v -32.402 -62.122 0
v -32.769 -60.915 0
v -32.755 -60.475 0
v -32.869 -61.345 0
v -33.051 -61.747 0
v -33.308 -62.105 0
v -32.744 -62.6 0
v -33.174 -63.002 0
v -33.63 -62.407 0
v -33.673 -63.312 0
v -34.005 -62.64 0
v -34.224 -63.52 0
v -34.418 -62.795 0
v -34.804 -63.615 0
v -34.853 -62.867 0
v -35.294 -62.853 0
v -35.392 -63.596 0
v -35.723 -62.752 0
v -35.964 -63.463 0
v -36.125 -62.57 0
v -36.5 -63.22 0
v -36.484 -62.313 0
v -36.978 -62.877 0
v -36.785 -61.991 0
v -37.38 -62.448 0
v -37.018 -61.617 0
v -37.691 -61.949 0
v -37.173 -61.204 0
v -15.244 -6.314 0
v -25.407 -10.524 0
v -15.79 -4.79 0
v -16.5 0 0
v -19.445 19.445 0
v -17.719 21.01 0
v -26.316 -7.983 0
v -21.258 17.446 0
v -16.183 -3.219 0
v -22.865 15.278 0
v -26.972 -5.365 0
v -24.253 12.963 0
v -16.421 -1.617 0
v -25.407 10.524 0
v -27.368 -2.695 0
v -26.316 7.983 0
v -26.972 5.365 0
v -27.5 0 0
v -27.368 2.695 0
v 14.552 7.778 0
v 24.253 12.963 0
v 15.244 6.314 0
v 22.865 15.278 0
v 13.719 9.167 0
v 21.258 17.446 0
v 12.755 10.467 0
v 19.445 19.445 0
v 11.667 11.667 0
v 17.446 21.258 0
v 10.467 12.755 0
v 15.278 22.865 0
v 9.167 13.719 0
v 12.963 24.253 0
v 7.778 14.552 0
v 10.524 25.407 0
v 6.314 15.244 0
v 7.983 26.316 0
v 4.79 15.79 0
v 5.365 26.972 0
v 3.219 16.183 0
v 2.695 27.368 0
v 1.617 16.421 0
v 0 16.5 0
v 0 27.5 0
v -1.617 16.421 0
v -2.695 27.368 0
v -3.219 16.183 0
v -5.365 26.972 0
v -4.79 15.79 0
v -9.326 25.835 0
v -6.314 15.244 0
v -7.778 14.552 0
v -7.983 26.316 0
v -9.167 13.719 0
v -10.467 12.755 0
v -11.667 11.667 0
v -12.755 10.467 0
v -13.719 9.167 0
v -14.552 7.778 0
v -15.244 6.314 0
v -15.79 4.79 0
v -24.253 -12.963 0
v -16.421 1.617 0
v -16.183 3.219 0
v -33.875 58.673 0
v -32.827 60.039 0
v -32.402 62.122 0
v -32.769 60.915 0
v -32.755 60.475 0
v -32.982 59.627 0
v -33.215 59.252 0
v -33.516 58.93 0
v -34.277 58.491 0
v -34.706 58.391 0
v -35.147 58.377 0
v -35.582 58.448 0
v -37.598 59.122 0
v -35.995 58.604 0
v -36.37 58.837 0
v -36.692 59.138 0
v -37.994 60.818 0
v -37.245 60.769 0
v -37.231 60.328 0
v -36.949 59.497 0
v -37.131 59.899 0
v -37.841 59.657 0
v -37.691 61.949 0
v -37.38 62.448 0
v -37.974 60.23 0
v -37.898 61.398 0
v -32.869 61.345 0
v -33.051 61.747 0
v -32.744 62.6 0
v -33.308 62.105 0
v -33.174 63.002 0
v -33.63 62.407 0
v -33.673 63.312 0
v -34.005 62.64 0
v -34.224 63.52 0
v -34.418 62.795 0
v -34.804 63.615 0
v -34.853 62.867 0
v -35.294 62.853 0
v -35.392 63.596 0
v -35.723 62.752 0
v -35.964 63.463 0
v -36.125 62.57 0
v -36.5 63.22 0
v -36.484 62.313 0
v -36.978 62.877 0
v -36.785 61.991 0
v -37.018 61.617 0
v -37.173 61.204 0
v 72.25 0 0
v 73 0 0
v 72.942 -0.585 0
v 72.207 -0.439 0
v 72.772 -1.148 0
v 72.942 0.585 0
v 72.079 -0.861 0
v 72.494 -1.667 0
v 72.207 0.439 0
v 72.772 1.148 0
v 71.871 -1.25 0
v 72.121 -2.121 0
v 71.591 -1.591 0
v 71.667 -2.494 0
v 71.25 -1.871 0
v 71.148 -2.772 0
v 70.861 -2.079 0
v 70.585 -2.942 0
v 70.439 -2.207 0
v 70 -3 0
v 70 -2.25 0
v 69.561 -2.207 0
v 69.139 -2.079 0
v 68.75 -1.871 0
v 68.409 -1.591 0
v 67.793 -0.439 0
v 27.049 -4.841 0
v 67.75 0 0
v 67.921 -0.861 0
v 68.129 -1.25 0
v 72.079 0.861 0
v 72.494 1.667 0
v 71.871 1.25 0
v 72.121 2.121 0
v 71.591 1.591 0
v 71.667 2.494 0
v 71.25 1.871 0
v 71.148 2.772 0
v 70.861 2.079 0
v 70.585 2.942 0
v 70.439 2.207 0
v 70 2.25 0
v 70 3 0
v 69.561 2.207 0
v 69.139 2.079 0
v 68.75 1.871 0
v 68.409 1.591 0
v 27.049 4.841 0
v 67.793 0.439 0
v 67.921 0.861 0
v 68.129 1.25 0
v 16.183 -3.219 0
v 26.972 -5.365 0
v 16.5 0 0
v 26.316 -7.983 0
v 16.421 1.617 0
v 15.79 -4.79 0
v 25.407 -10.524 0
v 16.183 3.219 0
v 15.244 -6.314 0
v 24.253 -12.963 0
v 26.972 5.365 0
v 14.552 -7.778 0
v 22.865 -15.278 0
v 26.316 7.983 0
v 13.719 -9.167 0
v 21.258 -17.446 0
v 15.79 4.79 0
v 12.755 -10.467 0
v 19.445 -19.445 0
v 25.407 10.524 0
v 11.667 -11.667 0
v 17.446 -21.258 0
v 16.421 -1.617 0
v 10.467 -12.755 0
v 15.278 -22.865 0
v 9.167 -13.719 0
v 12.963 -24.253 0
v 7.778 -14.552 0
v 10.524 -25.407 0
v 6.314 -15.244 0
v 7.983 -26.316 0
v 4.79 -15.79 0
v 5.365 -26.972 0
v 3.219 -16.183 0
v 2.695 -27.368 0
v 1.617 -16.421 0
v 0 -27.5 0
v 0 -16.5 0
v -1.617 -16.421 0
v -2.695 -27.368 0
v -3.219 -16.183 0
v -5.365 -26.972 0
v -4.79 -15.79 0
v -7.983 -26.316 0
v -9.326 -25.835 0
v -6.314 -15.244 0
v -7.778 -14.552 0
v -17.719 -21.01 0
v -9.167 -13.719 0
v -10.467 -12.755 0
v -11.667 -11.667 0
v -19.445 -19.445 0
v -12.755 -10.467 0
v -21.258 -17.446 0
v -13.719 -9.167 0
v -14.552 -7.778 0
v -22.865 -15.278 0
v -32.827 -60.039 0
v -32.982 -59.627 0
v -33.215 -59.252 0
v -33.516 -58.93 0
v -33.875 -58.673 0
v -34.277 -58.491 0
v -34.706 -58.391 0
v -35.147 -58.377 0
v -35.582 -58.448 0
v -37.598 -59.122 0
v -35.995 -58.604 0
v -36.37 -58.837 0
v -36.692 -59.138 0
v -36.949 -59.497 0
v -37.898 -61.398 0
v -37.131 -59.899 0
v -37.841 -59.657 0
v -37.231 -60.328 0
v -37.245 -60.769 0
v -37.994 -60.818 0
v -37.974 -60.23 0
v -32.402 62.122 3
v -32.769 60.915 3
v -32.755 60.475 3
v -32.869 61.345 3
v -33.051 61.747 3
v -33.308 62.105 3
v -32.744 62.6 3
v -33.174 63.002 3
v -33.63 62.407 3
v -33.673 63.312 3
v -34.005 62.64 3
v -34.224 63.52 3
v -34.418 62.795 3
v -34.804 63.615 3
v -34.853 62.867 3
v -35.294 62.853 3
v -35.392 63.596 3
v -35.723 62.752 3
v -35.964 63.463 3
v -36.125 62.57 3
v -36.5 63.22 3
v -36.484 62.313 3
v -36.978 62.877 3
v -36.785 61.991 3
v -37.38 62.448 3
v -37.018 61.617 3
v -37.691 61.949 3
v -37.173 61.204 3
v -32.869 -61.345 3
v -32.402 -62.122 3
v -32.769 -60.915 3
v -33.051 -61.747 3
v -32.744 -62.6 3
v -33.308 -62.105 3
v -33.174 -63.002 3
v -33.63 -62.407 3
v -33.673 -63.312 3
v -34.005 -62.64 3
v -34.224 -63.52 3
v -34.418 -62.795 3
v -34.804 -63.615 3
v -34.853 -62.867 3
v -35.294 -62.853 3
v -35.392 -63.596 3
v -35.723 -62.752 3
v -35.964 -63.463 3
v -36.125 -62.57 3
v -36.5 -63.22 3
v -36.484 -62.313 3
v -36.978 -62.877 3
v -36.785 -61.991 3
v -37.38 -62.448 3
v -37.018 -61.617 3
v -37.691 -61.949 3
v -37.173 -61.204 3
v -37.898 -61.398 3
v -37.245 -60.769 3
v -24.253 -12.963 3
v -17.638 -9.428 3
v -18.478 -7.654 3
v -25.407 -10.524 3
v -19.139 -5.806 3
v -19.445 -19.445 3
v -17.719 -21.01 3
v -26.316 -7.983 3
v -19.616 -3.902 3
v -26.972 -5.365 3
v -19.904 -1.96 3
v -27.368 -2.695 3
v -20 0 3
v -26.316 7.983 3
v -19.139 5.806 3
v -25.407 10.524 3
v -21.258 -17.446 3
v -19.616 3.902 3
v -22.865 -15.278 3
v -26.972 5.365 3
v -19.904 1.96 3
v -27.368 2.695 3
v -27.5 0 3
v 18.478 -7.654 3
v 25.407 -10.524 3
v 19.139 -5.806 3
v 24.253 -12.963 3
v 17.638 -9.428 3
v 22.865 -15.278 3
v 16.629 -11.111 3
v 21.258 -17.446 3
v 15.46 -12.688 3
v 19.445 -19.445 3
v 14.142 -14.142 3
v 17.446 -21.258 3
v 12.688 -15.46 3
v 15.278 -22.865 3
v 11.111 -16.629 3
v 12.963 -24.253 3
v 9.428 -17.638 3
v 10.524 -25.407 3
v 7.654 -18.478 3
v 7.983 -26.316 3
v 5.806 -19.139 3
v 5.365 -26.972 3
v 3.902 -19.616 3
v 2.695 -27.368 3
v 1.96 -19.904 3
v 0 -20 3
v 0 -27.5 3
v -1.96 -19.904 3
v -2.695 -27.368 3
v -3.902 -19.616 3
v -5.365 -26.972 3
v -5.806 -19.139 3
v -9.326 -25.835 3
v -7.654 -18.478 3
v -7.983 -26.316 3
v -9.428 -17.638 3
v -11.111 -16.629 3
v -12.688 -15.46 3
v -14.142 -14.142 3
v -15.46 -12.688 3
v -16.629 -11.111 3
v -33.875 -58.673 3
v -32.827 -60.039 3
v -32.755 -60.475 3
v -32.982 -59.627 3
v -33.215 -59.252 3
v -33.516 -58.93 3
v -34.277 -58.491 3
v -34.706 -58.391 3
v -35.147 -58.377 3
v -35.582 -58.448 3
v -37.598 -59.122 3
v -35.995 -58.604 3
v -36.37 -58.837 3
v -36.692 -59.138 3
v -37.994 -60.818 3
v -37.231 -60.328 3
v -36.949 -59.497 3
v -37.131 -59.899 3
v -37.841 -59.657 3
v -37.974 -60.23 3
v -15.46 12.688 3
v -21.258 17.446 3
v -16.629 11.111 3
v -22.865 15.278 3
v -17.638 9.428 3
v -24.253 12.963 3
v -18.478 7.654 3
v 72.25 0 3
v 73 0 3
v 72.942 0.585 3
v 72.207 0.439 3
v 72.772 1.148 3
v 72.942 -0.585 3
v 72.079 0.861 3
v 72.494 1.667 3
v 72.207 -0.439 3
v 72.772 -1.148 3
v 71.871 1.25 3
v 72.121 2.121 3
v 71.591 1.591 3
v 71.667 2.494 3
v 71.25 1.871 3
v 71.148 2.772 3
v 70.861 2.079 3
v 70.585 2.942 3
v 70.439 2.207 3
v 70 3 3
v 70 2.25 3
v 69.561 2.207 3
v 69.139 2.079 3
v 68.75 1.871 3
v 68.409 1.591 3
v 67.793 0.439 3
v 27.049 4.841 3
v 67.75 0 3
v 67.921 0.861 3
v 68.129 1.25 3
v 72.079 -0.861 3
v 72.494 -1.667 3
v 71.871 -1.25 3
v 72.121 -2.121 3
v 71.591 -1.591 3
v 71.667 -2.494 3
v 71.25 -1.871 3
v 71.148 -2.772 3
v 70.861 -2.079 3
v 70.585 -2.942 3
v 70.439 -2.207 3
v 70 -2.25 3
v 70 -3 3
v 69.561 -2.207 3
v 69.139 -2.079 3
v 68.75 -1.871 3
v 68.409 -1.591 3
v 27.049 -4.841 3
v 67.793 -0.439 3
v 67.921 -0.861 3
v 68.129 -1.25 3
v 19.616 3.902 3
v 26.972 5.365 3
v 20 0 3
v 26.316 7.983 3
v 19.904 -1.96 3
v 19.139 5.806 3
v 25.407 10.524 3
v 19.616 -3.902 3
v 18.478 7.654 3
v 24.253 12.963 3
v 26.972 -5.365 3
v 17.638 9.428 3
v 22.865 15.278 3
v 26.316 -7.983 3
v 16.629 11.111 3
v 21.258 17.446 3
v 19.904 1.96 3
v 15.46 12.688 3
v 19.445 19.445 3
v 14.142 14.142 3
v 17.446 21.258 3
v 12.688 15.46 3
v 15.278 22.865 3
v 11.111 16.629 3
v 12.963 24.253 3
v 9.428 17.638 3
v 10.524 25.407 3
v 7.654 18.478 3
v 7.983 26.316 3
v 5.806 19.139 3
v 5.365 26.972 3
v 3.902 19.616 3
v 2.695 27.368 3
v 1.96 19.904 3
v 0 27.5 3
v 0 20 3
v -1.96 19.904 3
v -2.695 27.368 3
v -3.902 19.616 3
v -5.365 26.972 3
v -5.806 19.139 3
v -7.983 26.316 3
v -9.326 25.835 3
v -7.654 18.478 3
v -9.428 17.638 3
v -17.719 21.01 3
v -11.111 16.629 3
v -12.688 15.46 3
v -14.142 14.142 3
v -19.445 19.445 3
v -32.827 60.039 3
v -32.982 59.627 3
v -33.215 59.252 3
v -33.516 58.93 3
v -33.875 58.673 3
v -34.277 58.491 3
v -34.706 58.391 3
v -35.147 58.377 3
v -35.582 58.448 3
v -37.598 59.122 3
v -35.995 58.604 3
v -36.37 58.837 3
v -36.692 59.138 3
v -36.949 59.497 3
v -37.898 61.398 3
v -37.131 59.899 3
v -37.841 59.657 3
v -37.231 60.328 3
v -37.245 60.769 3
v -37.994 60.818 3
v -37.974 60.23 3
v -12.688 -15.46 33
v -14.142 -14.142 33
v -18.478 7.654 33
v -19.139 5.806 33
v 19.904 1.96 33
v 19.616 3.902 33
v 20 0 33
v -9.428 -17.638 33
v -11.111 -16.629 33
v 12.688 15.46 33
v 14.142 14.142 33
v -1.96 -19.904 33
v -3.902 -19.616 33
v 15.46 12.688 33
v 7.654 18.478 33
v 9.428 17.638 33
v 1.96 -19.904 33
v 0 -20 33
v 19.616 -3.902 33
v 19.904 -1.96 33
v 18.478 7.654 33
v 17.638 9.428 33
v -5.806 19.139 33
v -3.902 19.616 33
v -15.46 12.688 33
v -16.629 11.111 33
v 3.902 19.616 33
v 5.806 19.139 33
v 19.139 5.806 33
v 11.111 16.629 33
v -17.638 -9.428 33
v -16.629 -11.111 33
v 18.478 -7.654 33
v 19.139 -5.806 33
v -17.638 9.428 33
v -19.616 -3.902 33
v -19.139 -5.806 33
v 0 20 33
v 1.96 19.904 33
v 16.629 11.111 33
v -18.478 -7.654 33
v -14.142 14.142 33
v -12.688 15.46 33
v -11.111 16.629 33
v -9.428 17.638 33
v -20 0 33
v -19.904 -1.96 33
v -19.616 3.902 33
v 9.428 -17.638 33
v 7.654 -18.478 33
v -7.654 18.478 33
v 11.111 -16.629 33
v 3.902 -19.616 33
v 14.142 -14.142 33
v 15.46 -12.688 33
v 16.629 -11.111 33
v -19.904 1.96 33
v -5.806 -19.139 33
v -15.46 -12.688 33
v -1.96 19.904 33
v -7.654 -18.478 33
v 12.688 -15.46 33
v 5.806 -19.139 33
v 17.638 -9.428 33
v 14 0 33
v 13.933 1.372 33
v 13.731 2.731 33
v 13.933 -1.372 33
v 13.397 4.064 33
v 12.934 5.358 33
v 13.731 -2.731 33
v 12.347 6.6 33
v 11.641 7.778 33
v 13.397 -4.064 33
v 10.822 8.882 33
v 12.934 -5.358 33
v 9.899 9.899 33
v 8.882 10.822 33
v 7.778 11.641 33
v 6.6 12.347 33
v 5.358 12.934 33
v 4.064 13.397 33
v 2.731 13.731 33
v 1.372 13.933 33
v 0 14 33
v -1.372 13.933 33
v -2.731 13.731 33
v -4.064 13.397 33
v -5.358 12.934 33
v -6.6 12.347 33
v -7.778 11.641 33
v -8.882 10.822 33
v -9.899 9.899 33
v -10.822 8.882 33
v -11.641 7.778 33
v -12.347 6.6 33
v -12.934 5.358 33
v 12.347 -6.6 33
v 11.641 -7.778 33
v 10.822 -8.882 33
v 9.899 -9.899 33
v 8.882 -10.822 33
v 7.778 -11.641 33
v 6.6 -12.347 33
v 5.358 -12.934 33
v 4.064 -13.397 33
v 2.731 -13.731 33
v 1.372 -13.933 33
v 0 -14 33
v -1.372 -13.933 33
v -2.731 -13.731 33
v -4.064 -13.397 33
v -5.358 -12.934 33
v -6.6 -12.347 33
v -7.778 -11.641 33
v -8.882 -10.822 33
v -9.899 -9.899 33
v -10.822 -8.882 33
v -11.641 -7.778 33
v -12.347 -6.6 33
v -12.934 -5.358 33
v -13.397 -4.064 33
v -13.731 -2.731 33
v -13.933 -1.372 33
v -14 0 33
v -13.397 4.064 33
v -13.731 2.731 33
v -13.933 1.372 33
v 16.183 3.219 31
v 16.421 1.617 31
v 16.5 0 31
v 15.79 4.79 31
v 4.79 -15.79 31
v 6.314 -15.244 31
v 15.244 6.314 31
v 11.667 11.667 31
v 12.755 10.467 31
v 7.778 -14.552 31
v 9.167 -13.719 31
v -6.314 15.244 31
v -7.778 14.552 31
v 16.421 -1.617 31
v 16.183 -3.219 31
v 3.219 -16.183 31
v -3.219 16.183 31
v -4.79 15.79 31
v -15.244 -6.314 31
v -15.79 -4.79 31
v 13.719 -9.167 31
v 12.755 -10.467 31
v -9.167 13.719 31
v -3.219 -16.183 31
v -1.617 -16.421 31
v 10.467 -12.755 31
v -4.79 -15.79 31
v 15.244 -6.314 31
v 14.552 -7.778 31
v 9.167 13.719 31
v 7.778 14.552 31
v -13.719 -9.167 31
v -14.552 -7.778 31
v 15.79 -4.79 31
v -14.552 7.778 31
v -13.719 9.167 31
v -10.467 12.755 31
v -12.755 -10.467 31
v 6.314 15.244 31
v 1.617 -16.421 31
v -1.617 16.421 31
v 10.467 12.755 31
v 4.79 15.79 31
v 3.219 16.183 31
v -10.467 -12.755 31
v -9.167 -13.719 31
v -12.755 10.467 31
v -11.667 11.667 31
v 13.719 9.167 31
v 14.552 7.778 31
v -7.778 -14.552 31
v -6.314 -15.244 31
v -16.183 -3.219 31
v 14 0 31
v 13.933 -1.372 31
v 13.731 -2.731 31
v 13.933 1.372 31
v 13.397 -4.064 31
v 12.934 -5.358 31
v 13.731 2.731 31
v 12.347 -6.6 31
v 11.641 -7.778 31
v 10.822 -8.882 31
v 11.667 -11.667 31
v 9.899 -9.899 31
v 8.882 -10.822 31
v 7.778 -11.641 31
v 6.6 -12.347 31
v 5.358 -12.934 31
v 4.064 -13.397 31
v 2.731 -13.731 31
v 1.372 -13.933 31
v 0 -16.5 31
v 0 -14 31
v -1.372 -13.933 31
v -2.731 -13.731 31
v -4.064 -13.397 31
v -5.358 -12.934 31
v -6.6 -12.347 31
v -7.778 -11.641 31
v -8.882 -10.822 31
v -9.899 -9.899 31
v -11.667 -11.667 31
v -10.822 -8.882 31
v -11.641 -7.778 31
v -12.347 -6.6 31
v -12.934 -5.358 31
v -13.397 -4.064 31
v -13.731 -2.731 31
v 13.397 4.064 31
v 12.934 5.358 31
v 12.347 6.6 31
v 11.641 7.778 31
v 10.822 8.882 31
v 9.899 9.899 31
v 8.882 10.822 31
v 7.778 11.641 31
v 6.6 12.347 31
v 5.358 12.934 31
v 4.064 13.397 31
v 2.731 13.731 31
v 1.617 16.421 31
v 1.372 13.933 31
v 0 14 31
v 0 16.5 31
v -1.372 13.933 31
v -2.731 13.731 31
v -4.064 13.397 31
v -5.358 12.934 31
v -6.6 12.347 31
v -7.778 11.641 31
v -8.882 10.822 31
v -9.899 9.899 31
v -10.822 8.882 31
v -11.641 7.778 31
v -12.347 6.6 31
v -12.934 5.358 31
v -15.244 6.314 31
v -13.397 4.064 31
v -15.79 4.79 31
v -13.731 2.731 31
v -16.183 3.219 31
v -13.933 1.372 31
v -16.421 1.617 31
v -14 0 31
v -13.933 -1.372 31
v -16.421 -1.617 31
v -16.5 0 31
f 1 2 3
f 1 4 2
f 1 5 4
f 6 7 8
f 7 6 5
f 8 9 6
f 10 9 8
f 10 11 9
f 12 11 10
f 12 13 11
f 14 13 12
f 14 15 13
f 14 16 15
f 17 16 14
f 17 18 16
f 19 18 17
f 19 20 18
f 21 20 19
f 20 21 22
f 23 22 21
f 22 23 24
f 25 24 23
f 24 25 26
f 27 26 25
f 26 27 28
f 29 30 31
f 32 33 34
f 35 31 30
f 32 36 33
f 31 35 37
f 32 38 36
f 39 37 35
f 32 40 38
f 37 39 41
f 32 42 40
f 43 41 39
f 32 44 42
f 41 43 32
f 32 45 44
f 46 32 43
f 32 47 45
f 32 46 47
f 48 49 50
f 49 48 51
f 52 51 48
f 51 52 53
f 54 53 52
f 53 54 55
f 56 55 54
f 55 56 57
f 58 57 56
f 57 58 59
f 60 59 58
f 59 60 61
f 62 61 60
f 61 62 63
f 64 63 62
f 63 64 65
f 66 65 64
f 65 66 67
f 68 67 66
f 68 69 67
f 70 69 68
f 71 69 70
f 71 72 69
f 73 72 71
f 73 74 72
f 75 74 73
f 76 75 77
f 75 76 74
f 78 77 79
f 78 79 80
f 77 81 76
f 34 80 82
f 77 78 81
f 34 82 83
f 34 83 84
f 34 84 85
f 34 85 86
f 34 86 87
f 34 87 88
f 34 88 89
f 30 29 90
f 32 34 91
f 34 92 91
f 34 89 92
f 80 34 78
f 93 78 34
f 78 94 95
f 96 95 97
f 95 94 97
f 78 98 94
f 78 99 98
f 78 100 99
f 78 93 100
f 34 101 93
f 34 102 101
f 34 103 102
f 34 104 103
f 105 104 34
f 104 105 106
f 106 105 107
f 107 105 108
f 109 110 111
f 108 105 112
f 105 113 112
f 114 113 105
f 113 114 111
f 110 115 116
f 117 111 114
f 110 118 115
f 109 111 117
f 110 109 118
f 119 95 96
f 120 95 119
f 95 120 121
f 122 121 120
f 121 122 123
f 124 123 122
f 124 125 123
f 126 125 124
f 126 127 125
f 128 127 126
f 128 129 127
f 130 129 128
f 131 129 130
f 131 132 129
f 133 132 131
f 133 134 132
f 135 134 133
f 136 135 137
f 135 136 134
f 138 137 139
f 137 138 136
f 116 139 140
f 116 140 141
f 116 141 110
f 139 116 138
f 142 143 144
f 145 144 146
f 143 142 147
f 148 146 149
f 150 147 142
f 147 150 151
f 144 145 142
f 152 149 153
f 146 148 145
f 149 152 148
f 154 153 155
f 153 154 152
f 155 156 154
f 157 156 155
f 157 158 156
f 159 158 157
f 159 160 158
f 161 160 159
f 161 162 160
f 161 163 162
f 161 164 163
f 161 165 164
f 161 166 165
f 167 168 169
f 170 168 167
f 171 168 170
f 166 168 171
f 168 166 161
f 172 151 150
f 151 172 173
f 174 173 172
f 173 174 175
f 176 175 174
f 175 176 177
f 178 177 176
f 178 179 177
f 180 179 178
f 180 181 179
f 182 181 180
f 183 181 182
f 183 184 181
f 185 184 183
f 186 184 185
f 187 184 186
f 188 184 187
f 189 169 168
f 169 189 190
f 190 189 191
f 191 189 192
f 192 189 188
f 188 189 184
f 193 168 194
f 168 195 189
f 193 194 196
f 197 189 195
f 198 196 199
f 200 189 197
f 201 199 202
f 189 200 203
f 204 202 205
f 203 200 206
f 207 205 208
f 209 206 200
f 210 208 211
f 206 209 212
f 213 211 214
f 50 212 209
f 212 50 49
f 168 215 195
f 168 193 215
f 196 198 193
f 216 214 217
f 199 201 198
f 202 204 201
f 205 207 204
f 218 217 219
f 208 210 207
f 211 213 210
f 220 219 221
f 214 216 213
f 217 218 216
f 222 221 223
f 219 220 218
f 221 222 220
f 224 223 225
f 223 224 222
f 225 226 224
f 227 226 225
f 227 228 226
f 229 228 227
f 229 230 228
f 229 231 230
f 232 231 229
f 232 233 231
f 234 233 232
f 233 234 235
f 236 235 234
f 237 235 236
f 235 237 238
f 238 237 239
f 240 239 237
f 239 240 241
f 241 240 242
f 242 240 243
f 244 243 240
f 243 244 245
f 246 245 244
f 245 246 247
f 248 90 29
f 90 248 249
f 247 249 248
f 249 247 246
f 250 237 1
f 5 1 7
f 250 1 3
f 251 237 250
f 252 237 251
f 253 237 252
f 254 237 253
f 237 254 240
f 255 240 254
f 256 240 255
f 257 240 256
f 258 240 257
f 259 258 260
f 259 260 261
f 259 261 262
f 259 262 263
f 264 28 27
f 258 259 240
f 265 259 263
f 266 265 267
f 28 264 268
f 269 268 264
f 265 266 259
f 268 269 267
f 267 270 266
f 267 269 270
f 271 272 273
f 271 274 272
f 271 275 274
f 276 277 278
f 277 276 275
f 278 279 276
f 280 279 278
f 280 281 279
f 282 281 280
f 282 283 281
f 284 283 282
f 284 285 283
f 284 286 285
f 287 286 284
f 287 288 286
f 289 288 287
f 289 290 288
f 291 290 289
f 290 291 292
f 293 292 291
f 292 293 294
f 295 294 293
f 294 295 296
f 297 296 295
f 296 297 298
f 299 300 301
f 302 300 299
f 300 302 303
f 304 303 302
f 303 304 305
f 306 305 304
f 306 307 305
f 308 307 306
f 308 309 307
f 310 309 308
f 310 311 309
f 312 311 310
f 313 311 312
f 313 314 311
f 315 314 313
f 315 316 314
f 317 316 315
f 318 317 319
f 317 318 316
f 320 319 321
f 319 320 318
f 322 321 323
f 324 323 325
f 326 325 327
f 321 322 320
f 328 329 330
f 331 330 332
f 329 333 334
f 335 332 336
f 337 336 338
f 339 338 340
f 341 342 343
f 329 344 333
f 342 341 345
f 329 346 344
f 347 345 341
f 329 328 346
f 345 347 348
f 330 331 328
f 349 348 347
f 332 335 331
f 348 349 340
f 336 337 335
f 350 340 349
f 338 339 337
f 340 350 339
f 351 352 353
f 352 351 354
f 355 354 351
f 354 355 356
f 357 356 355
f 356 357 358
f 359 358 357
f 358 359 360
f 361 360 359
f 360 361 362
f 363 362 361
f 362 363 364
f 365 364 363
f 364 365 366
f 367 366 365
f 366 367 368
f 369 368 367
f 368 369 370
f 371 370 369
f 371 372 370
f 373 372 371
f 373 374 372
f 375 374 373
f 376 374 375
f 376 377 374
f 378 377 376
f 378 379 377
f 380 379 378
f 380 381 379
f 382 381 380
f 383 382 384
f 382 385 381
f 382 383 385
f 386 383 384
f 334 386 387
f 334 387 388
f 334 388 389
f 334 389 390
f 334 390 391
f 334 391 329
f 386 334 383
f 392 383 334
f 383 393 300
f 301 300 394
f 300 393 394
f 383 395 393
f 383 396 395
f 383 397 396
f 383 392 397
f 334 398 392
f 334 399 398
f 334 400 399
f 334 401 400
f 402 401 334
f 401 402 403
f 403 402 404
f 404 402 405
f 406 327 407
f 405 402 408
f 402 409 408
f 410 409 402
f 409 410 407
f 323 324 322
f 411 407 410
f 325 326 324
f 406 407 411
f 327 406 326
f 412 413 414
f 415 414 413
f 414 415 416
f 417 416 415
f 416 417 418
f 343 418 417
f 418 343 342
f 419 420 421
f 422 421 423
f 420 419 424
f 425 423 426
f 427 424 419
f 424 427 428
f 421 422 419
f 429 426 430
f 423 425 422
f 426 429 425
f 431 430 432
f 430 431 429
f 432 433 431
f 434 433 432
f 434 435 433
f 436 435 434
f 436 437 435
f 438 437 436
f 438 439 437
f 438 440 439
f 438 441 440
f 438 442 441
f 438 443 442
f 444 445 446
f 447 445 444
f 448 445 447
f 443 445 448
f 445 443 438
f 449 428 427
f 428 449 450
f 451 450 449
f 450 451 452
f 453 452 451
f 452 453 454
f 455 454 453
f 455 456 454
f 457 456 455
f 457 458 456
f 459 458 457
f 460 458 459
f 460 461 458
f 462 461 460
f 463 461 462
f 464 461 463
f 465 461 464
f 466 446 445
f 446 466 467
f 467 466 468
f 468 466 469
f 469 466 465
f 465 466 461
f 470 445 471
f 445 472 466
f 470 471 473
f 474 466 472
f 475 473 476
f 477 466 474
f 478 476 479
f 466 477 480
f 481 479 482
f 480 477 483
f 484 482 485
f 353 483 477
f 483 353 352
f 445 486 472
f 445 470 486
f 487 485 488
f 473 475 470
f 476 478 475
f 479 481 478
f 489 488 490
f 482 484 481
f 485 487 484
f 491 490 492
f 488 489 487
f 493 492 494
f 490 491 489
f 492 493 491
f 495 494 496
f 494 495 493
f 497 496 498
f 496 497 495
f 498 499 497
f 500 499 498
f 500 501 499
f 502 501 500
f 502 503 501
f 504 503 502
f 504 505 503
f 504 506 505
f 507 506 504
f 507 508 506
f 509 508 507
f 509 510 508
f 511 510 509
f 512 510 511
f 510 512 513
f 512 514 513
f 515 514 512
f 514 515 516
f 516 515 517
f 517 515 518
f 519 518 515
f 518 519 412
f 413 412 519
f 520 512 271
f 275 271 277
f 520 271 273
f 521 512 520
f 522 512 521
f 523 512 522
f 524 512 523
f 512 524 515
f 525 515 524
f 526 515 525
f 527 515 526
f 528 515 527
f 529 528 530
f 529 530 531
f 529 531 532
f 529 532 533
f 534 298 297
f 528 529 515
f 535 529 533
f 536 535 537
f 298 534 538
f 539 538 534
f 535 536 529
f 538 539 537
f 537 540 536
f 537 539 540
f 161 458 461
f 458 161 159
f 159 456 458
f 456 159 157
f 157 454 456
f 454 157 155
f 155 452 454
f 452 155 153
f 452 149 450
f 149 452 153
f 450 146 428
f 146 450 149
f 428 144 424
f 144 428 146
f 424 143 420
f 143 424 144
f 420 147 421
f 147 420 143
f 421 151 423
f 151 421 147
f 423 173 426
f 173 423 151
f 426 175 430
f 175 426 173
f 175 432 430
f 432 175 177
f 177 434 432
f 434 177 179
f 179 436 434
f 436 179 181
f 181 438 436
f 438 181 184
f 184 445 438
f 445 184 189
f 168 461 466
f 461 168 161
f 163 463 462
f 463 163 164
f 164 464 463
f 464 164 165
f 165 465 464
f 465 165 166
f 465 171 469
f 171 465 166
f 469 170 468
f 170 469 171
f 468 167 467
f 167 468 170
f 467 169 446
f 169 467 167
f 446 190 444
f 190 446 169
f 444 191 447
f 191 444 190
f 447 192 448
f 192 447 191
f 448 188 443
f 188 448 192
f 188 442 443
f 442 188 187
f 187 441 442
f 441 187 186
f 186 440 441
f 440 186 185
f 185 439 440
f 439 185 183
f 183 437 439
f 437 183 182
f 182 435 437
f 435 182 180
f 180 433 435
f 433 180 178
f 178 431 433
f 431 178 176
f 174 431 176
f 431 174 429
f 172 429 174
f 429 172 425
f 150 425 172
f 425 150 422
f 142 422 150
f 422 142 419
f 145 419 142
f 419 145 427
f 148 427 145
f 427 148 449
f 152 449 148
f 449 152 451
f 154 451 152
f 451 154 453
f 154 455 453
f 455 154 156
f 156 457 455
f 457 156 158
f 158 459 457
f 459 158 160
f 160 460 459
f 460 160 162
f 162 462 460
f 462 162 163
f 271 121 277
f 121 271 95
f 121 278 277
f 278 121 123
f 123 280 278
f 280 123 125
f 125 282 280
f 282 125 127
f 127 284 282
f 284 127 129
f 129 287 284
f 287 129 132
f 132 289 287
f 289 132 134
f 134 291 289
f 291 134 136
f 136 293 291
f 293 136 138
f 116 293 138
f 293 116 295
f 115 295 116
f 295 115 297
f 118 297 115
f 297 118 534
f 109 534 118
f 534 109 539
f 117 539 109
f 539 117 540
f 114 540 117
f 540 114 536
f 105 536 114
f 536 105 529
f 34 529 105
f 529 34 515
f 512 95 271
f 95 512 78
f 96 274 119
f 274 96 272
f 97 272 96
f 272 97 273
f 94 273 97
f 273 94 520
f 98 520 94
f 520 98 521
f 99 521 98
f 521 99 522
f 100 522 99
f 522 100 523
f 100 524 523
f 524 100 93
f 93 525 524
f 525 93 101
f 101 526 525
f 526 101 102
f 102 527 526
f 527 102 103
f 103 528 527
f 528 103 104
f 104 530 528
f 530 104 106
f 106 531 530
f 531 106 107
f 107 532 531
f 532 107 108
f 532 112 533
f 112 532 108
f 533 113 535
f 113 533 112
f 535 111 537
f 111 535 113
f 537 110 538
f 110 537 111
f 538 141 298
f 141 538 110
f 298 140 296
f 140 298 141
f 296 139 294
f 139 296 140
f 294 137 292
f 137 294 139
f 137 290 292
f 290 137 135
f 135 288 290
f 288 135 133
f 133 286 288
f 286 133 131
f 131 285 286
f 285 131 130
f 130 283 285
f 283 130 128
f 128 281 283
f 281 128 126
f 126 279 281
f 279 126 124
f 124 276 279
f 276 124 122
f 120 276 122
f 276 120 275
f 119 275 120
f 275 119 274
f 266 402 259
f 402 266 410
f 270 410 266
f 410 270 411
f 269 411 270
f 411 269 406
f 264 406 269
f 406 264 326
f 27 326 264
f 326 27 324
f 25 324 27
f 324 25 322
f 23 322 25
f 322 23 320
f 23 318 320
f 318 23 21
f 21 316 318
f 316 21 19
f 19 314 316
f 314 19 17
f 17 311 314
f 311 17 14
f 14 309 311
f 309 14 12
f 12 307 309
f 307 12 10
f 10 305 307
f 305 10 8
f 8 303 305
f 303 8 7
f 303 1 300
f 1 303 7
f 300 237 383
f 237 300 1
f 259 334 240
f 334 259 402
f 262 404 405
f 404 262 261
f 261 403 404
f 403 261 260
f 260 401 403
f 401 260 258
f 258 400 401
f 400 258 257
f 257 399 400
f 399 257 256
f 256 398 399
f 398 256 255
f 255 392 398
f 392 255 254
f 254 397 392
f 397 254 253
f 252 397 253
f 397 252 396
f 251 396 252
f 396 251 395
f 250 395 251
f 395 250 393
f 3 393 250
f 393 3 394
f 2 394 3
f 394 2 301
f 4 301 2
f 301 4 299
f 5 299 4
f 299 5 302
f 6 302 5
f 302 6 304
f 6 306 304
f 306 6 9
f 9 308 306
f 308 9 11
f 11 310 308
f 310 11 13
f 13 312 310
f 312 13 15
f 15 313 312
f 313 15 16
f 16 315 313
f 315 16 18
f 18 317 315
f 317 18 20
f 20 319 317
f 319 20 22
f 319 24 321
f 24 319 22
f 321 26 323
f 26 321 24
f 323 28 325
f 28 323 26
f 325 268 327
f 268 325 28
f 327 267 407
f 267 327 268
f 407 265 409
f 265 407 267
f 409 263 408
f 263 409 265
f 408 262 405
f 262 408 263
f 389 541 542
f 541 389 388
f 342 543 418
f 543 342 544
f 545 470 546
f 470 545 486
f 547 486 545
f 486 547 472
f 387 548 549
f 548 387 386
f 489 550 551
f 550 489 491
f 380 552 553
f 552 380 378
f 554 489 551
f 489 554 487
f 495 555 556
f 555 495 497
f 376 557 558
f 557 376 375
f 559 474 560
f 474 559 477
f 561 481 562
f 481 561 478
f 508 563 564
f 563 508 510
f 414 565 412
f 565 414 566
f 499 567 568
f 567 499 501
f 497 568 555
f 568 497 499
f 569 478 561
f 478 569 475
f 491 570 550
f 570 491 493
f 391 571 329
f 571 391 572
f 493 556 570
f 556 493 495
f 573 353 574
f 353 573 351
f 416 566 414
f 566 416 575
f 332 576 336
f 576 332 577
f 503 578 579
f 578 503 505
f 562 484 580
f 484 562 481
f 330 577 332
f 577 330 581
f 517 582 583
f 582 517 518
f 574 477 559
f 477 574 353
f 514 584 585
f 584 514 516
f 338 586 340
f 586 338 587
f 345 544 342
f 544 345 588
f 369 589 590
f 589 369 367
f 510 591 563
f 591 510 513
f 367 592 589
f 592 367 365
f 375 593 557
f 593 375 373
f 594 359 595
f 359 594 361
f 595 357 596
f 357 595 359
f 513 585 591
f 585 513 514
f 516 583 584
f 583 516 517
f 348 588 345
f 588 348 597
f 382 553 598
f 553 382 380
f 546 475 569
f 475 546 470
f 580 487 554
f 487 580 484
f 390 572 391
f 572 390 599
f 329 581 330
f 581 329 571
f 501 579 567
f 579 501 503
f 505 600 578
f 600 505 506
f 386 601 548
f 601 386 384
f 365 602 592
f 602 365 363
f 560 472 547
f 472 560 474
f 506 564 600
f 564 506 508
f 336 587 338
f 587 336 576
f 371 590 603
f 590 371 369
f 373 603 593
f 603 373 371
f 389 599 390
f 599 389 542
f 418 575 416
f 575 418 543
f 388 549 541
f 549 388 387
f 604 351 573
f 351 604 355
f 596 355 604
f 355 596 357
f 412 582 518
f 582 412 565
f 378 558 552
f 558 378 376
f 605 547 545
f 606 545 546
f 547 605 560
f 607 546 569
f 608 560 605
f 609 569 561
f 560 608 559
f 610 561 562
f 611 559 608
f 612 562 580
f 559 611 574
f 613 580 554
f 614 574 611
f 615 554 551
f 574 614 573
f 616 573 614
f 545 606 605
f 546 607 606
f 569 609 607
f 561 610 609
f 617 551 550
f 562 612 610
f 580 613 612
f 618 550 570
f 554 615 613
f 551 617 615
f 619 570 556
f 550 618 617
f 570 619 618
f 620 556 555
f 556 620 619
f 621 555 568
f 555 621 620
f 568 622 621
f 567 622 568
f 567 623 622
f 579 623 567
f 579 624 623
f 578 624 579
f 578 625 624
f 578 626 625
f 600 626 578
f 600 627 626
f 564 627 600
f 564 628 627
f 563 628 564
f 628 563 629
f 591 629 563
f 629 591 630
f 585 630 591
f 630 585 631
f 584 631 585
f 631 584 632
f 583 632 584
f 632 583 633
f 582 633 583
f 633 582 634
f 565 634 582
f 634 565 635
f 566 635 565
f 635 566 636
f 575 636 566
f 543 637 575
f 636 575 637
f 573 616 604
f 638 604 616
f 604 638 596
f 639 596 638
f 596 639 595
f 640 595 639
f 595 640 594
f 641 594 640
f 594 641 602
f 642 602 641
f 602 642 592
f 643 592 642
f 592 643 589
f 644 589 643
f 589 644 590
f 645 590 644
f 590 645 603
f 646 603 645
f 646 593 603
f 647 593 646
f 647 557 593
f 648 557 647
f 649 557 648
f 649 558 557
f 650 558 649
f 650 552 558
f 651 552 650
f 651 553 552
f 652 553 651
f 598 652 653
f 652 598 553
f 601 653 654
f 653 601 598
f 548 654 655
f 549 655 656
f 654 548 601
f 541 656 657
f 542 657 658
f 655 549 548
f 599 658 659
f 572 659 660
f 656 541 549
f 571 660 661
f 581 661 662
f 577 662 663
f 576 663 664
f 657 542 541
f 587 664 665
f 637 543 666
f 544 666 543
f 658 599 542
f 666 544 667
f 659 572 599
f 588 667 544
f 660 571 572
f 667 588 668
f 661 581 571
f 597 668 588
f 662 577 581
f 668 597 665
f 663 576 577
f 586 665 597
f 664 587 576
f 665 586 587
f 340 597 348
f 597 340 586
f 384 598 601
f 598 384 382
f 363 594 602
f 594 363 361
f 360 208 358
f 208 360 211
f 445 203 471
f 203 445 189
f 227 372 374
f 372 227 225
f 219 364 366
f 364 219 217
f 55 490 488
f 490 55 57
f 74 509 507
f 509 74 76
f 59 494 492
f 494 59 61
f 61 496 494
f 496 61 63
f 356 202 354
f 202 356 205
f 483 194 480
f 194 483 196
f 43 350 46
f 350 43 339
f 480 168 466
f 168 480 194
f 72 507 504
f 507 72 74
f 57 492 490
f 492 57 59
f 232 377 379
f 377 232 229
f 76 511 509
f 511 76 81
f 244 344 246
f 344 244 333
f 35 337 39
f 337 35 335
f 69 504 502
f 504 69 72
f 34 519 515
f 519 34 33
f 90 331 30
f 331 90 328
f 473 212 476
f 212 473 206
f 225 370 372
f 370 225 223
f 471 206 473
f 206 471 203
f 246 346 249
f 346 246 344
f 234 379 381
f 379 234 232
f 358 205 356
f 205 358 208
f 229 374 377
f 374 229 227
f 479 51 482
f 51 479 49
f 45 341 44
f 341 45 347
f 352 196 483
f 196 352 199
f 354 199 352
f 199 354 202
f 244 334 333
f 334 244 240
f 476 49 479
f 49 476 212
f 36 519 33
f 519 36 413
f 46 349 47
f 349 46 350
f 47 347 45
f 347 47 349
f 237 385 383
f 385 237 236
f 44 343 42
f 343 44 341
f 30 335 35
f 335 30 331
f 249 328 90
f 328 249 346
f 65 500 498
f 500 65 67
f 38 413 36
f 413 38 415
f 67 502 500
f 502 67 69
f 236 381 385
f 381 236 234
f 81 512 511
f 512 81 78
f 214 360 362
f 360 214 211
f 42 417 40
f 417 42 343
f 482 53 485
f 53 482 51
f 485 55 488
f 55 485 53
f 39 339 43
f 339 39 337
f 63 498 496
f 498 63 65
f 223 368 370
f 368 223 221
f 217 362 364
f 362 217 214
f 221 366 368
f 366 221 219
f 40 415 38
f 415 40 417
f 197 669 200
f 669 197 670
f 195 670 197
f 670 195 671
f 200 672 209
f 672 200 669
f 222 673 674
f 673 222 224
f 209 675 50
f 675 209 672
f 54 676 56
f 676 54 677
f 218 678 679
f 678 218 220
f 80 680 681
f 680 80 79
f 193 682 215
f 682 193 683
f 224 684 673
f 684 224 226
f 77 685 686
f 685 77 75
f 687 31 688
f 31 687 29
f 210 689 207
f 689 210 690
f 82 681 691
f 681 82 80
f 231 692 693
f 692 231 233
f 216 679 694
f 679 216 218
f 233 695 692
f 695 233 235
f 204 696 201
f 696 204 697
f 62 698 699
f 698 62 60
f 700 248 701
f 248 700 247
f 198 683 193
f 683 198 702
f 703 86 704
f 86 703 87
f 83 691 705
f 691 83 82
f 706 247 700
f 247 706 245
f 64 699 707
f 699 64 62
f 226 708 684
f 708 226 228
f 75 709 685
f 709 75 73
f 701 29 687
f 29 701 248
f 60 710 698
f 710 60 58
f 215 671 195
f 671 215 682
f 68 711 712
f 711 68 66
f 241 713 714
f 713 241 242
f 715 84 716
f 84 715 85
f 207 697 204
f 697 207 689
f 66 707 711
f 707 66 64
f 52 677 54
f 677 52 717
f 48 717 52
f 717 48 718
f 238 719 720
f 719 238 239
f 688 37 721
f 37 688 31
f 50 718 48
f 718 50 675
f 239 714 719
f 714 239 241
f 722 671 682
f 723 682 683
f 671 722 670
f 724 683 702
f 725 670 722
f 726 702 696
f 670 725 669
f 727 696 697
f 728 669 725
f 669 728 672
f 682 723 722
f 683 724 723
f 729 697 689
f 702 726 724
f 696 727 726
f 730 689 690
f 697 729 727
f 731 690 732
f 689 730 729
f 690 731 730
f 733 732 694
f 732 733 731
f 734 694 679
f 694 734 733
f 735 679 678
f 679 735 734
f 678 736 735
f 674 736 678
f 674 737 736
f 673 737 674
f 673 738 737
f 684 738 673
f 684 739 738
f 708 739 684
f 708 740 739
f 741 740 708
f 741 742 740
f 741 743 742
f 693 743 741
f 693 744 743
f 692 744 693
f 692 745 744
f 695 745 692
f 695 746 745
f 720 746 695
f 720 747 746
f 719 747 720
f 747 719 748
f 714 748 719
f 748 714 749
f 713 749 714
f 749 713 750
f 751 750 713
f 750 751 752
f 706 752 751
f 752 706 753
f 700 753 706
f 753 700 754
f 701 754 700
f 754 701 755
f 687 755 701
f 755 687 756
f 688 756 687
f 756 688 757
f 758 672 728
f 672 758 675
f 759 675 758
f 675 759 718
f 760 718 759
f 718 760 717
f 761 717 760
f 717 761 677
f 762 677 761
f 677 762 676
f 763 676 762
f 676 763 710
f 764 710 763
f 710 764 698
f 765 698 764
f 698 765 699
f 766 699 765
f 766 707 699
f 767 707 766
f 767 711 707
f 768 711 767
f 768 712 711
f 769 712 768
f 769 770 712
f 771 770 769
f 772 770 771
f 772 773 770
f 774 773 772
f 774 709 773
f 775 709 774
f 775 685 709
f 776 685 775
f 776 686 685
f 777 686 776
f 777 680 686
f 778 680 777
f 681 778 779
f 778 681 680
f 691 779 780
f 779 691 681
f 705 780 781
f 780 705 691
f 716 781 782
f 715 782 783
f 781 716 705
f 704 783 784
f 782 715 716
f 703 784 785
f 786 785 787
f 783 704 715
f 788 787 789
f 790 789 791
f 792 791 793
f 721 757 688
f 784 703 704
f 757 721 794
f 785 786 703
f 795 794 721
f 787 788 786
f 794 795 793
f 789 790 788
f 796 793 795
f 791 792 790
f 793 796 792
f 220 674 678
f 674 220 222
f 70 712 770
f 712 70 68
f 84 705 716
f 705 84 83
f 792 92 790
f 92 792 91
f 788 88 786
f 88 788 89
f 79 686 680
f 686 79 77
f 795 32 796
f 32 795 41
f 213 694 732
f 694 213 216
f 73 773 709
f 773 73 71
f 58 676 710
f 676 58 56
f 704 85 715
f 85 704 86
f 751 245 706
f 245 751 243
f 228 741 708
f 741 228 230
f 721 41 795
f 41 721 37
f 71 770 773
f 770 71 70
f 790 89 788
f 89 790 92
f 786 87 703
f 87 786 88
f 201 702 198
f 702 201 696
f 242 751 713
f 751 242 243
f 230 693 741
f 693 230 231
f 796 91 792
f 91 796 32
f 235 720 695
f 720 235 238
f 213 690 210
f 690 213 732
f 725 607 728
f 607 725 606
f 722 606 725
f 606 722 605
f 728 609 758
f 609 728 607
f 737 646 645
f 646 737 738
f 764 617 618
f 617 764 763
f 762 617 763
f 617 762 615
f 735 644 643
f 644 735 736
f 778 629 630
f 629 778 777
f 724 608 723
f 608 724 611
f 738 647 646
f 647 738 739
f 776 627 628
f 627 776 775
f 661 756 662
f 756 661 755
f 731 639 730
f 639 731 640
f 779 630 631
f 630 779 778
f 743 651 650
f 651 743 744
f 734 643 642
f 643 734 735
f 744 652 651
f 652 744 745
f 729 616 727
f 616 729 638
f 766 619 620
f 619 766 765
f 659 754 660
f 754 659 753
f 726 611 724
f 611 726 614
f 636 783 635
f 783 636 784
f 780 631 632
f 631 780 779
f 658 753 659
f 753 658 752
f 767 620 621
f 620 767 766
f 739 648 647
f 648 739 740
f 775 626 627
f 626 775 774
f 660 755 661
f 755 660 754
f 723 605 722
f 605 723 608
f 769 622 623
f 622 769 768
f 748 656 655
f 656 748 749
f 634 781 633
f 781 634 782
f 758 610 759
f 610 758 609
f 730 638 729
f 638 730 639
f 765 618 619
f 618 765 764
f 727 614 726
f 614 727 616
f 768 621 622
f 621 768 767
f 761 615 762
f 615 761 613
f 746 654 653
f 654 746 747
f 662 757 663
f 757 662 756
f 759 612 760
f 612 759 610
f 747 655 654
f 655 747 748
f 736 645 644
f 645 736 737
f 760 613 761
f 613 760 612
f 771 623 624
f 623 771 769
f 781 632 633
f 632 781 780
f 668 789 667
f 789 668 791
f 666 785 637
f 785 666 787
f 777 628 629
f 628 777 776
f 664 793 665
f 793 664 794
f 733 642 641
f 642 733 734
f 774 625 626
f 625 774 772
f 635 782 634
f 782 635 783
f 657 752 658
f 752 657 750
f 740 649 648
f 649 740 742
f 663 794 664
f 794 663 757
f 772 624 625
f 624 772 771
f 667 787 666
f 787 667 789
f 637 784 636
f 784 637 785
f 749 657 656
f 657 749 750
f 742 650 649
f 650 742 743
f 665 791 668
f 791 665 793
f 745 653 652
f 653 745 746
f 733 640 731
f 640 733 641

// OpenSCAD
// Low-profile lampshade base with an integrated adaptor mount: a spoked disc
// with straight foot-mounting holes around its rim and a central boss that
// the adaptor (see ../adaptor/adaptor.scad) mounts into.
//
// Placeholder: geometry not yet implemented -- currently just previews the
// mount boss and foot-hole positions so the parameter set can be wired up
// and iterated on before the spoke/rim shape is designed.
module low_pro_with_adaptor(
    num_spokes = 3,             // number of spokes joining the rim to the center mount (also the number of foot-mounting holes, one per spoke)
    foot_hole_diameter = 4.5,   // diameter of each straight foot-mounting hole, bottom to top (mm)
    foot_hole_radius = 70,      // radius from center at which the foot-mounting holes sit, one per spoke, on the spoke's centerline (mm)
    spoke_width = 6,            // width of each spoke at its tip, i.e. at the foot-mounting hole (mm)
    spoke_width_center = 12,    // width of each spoke at the center mount, tapering down to spoke_width at the tip (mm)
    spoke_height = 3,           // height of each spoke (mm)
    mount_od = 40,              // outer diameter of the central adaptor-mount boss (mm)
    mount_id = 33,               // inner diameter of the central adaptor-mount boss, i.e. the bore the adaptor sits in (mm)
    mount_height = 30,           // height of the central adaptor-mount boss (mm)
    mount_hole_diameter = 28   // diameter of the fixing hole(s) through the mount boss, e.g. for a self-tapping screw into the adaptor (mm)
) {
    union() {    
        difference() {
            union() {
                cylinder(h = mount_height + spoke_height, d = mount_od, $fn = 64);
                cylinder(h = spoke_height, d = mount_od + 15, $fn = 64);
                for (n = [0:1:num_spokes]) {
                    rotate([0,0,n*360/num_spokes]) {
                        linear_extrude(spoke_height) {
                            difference() {
                                union() {
                                    polygon(points = [
                                        [0, spoke_width_center/2],
                                        [foot_hole_radius, spoke_width/2],
                                        [foot_hole_radius, -spoke_width/2],
                                        [0, -spoke_width_center/2]
                                    ]);
                                    translate([foot_hole_radius,0,-1]) circle(d = spoke_width, $fn = 32);
                                }
                                translate([foot_hole_radius,0,-1]) circle(d = foot_hole_diameter, $fn = 32);
                            }
                        }
                    }
                }
            }
            translate([0, 0, -1]) cylinder(h = mount_height + spoke_height - 1, d = mount_id, $fn = 64);
            translate([0, 0, -1]) cylinder(h = mount_height + spoke_height + 2, d = mount_hole_diameter, $fn = 64);
        }        
    }
}

// Standalone preview with default parameters
low_pro_with_adaptor();
